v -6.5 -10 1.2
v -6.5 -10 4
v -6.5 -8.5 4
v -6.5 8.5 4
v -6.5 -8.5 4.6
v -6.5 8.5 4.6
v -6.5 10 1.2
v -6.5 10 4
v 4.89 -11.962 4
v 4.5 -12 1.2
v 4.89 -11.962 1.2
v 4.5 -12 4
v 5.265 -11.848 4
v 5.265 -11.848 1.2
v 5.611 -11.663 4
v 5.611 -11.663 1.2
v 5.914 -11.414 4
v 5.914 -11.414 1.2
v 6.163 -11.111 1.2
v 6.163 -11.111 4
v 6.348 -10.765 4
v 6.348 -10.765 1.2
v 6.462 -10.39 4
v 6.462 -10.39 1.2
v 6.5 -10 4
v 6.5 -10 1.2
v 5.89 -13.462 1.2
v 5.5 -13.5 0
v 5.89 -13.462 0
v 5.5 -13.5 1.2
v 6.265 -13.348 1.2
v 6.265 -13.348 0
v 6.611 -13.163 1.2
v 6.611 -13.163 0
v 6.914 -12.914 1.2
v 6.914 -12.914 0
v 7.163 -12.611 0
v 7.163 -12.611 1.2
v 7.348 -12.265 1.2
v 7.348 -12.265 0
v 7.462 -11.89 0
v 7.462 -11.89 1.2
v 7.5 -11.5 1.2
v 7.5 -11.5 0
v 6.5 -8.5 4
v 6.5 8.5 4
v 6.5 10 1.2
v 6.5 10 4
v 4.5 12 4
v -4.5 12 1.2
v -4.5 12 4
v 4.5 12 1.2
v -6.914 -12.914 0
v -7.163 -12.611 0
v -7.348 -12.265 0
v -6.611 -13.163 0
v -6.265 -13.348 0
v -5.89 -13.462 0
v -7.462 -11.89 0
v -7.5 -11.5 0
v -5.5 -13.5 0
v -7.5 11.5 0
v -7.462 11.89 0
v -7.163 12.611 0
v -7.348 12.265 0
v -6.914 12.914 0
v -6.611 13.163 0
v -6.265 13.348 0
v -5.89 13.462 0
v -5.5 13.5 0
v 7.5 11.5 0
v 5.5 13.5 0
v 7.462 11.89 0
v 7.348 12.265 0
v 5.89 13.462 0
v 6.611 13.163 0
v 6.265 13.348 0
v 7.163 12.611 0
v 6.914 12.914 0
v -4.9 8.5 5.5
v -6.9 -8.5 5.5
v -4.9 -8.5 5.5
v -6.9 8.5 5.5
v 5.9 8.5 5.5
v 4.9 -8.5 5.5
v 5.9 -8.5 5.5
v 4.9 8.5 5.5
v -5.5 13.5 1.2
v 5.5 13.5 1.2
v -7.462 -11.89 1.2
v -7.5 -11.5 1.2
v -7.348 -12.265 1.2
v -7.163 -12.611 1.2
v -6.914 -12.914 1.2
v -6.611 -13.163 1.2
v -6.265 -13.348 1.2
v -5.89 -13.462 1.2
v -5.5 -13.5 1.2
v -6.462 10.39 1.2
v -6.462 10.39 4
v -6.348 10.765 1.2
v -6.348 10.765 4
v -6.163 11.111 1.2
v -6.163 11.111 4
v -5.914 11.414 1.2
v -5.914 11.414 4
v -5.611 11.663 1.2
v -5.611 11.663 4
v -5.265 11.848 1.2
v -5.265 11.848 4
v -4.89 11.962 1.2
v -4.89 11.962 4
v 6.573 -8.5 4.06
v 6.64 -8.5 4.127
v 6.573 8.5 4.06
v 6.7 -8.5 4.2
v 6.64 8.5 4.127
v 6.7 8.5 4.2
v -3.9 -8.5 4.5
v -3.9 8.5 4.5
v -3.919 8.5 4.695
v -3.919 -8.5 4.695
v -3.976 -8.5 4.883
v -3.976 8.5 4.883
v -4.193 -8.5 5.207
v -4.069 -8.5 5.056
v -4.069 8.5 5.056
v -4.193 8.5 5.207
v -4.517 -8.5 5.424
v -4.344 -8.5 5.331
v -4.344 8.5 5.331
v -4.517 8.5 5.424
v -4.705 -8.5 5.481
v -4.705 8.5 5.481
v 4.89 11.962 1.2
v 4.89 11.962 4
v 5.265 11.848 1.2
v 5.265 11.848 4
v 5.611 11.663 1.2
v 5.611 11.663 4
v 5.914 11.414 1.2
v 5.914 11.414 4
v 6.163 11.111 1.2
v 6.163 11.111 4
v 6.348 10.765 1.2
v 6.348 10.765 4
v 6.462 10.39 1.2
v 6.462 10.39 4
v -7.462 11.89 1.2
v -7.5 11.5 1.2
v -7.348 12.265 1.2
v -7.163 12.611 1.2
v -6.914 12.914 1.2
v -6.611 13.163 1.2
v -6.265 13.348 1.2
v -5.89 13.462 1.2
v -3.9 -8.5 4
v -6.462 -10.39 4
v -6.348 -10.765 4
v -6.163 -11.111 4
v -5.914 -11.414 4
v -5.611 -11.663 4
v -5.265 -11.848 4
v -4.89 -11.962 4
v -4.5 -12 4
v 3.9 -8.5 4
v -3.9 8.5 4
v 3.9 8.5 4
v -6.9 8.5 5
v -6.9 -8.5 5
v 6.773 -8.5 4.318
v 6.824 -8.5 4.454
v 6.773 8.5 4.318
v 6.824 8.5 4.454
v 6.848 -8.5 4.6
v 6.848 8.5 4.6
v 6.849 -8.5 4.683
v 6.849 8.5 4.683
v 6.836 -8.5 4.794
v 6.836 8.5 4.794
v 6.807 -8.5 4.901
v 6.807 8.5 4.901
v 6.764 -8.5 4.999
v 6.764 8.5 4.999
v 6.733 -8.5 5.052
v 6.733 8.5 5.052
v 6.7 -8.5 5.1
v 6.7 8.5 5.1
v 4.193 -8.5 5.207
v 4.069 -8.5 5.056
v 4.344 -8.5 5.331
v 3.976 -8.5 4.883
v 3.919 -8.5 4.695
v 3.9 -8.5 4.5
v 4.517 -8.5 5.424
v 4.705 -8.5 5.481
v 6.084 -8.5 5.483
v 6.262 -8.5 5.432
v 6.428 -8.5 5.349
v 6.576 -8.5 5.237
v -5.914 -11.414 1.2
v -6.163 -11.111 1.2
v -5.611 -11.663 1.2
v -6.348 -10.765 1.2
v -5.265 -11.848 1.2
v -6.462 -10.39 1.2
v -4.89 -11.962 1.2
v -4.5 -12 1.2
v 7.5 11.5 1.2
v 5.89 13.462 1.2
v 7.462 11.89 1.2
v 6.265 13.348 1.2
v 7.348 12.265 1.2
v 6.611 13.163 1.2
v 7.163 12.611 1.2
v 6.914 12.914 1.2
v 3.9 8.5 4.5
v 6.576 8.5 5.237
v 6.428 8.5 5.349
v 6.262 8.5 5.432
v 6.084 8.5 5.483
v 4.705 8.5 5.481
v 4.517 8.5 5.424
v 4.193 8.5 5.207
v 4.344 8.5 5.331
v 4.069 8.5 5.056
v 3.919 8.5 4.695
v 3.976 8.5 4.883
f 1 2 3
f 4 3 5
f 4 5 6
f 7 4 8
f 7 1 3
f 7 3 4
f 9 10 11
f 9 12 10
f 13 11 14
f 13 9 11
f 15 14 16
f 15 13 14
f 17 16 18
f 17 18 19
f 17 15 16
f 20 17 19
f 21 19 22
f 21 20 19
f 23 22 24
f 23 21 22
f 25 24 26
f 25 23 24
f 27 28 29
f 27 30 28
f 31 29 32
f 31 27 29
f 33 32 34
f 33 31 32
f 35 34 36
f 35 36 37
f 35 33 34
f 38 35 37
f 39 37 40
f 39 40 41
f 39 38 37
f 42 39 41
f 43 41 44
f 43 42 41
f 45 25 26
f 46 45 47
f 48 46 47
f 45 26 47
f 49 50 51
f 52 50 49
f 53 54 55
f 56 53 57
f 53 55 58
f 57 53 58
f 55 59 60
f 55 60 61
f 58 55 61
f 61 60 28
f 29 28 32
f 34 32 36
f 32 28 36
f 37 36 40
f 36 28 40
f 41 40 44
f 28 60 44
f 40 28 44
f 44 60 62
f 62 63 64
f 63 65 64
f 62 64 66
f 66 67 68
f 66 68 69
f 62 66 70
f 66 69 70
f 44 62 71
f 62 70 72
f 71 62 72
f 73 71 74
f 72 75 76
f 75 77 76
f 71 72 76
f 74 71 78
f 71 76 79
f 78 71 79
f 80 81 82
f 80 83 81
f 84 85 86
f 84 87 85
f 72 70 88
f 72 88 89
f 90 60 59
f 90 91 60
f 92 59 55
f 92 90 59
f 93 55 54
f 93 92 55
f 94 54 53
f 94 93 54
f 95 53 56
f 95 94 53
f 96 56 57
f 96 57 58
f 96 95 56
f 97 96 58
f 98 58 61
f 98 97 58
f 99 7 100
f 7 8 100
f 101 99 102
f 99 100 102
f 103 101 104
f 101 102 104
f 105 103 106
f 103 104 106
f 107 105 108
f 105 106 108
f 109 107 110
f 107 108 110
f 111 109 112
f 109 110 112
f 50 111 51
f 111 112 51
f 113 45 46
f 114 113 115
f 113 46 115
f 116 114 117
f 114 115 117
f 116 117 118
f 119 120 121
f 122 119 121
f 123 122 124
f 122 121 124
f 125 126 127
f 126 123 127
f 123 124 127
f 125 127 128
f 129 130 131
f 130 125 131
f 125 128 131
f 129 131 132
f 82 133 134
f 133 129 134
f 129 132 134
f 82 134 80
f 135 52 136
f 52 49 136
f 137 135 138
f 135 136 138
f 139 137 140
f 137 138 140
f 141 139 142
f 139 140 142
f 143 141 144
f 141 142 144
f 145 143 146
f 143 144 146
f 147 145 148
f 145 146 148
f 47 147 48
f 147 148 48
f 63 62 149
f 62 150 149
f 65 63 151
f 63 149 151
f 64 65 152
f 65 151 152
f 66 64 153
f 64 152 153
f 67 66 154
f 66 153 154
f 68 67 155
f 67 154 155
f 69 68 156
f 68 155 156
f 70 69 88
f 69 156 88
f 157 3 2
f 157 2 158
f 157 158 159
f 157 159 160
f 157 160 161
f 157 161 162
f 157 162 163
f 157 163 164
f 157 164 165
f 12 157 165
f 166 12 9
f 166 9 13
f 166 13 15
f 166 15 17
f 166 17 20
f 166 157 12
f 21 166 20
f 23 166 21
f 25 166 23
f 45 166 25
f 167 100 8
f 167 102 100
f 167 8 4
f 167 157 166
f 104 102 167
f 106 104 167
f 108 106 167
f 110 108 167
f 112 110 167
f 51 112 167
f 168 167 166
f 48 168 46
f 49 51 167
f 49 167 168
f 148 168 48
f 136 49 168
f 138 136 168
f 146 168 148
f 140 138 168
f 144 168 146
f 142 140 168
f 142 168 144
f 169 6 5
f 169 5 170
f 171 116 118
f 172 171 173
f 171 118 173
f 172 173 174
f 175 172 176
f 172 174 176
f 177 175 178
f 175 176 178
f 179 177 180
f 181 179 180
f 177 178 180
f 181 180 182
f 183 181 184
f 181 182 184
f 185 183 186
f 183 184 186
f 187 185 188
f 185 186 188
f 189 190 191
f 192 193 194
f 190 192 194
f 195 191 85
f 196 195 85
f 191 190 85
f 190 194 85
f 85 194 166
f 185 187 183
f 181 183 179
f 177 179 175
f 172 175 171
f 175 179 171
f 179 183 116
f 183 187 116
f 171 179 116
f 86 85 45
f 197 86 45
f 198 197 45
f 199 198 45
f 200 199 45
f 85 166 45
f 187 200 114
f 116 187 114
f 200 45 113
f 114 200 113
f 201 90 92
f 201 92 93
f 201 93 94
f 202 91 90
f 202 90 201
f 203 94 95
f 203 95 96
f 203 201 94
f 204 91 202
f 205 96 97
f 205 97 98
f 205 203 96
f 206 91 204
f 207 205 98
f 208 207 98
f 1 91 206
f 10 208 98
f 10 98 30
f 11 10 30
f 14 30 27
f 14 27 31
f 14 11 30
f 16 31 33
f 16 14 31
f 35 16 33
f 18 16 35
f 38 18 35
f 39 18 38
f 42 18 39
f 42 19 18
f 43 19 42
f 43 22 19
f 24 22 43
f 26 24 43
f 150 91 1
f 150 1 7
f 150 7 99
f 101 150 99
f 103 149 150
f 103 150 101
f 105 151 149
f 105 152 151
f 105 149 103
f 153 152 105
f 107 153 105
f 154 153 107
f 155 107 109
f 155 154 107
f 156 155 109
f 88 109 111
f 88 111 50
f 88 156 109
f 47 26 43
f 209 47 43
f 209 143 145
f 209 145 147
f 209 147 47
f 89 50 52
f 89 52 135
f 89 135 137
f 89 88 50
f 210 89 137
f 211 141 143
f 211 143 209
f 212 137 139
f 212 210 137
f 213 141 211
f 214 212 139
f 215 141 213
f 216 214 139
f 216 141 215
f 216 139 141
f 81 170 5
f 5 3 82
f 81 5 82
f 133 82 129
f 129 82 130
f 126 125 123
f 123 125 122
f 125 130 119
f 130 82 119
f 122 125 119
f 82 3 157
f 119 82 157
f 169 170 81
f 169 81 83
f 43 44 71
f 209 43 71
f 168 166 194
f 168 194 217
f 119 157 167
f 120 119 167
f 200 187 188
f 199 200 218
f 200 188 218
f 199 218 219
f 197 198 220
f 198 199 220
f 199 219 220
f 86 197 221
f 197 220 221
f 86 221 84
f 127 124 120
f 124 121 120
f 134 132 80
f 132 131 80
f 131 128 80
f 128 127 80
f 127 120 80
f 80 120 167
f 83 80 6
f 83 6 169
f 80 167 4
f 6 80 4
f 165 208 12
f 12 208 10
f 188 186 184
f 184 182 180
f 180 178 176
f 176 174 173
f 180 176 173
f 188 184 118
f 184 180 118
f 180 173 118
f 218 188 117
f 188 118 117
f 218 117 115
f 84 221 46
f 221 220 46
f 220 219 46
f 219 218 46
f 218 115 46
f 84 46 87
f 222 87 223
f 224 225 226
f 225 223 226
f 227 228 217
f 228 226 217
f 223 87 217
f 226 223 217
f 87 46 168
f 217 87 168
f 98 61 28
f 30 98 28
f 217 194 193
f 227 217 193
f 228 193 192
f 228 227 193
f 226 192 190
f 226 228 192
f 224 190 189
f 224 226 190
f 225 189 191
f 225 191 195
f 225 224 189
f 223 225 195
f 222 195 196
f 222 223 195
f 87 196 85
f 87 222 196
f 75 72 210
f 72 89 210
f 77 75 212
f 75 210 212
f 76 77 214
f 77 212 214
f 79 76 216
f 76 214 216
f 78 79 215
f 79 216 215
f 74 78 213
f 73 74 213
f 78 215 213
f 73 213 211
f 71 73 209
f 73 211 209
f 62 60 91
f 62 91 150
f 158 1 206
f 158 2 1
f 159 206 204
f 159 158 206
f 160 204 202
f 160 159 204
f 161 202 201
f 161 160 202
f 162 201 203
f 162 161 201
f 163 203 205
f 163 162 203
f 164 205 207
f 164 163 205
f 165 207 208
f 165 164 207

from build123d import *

# Parameters (mm, degrees)
F0_W        = 15
F0_H        = 27
F0_W_2      = 13
F0_H_2      = 24
F1_DEPTH    = 1.2
F2_DEPTH    = 4
F3_R        = 2
F4_W        = 2.6
F4_H        = 17
F4_W_2      = 0.4
F5_DEPTH    = 1.5
F6_T1_DEPTH = 21
F6_T3_DEPTH = 22
F7_T4_DEPTH = 22.1433659759
F8_R        = 0.75


# Not quite as in the source:
# - a fillet or chamfer that OpenCascade refuses, or shapes differently, is made with other operations: its cross-section is extruded or revolved along the edge and cut away or added


with BuildPart() as f1:
    # F0 (on Top) → F1 (new body)
    with BuildSketch(Plane.XY):
        Rectangle(F0_W, F0_H)
        Rectangle(F0_W_2, F0_H_2, mode=Mode.SUBTRACT)
    extrude(amount=F1_DEPTH)

    # F0 (on Top) → F2 (join)
    with BuildSketch(Plane.XY):
        Rectangle(F0_W_2, F0_H_2)
    extrude(amount=F2_DEPTH)

    # F3
    f3_edges = [f1.edges().sort_by_distance(p)[0] for p in [
        (6.5, 12, 2.6),
        (7.5, 13.5, 0.6),
        (-6.5, 12, 2.6),
        (-7.5, 13.5, 0.6),
        (-6.5, -12, 2.6),
        (-7.5, -13.5, 0.6),
        (7.5, -13.5, 0.6),
        (6.5, -12, 2.6),
    ]]
    fillet(f3_edges, radius=F3_R)

    # F4 (on face) → F5 (join)
    with BuildSketch(Plane.XY.offset(4)):
        with Locations((-5.2, 0)):
            Rectangle(F4_W, F4_H)
        with Locations((6.7, 0)):
            Rectangle(F4_W_2, F4_H)
        with Locations((5.2, 0)):
            Rectangle(F4_W, F4_H)
        with Locations((-6.7, 0)):
            Rectangle(F4_W_2, F4_H)
    extrude(amount=F5_DEPTH)

    # F6: fillet of radius 1 on 4 edges, made by hand

    # F6_s2 → F6_t1 (cut)
    with BuildSketch(Plane.XZ.offset(-10.5)):
        with BuildLine():
            ThreePointArc((6.5, 4), (6.794427191, 4.3527864045), (6.9, 4.8))
            Line((6.9, 4.8), (6.9, 4))
            Line((6.9, 4), (6.5, 4))
        make_face()
    extrude(amount=F6_T1_DEPTH, mode=Mode.SUBTRACT)

    # F6_s4 → F6_t3 (cut)
    with BuildSketch(Plane.XZ.offset(-11)):
        with BuildLine():
            ThreePointArc((6.9, 4.5), (6.6071067812, 5.2071067812), (5.9, 5.5))
            Line((5.9, 5.5), (6.9, 5.5))
            Line((6.9, 5.5), (6.9, 4.5))
        make_face()
        with BuildLine():
            ThreePointArc((-3.9, 4.5), (-4.1928932188, 5.2071067812), (-4.9, 5.5))
            Line((-4.9, 5.5), (-3.9, 5.5))
            Line((-3.9, 5.5), (-3.9, 4.5))
        make_face()
        with BuildLine():
            ThreePointArc((3.9, 4.5), (4.1928932188, 5.2071067812), (4.9, 5.5))
            Line((4.9, 5.5), (3.9, 5.5))
            Line((3.9, 5.5), (3.9, 4.5))
        make_face()
    extrude(amount=F6_T3_DEPTH, mode=Mode.SUBTRACT)

    # F7: chamfer of 1 on 1 edges, made by hand


with BuildPart() as f7_tool2:
    # F7_s3 → F7_t4 (new body)
    with BuildSketch(Plane.XZ.offset(-11.071682988)):
        Polygon((-5.9, 4), (-6.9, 5), (-6.9, 4), align=None)
    extrude(amount=F7_T4_DEPTH)

    split(bisect_by=Plane.YZ.offset(-6.5), keep=Keep.BOTTOM)


with BuildPart() as f1_1:
    add(f1.part)

    # F7_t1: cut F7_tool2
    add(f7_tool2.part, mode=Mode.SUBTRACT)

    # F8
    f8_edges = [f1_1.edges().sort_by_distance(p)[0] for p in [
        (6.888686, 0, 4.65),
    ]]
    fillet(f8_edges, radius=F8_R)


solid = f1_1.part
